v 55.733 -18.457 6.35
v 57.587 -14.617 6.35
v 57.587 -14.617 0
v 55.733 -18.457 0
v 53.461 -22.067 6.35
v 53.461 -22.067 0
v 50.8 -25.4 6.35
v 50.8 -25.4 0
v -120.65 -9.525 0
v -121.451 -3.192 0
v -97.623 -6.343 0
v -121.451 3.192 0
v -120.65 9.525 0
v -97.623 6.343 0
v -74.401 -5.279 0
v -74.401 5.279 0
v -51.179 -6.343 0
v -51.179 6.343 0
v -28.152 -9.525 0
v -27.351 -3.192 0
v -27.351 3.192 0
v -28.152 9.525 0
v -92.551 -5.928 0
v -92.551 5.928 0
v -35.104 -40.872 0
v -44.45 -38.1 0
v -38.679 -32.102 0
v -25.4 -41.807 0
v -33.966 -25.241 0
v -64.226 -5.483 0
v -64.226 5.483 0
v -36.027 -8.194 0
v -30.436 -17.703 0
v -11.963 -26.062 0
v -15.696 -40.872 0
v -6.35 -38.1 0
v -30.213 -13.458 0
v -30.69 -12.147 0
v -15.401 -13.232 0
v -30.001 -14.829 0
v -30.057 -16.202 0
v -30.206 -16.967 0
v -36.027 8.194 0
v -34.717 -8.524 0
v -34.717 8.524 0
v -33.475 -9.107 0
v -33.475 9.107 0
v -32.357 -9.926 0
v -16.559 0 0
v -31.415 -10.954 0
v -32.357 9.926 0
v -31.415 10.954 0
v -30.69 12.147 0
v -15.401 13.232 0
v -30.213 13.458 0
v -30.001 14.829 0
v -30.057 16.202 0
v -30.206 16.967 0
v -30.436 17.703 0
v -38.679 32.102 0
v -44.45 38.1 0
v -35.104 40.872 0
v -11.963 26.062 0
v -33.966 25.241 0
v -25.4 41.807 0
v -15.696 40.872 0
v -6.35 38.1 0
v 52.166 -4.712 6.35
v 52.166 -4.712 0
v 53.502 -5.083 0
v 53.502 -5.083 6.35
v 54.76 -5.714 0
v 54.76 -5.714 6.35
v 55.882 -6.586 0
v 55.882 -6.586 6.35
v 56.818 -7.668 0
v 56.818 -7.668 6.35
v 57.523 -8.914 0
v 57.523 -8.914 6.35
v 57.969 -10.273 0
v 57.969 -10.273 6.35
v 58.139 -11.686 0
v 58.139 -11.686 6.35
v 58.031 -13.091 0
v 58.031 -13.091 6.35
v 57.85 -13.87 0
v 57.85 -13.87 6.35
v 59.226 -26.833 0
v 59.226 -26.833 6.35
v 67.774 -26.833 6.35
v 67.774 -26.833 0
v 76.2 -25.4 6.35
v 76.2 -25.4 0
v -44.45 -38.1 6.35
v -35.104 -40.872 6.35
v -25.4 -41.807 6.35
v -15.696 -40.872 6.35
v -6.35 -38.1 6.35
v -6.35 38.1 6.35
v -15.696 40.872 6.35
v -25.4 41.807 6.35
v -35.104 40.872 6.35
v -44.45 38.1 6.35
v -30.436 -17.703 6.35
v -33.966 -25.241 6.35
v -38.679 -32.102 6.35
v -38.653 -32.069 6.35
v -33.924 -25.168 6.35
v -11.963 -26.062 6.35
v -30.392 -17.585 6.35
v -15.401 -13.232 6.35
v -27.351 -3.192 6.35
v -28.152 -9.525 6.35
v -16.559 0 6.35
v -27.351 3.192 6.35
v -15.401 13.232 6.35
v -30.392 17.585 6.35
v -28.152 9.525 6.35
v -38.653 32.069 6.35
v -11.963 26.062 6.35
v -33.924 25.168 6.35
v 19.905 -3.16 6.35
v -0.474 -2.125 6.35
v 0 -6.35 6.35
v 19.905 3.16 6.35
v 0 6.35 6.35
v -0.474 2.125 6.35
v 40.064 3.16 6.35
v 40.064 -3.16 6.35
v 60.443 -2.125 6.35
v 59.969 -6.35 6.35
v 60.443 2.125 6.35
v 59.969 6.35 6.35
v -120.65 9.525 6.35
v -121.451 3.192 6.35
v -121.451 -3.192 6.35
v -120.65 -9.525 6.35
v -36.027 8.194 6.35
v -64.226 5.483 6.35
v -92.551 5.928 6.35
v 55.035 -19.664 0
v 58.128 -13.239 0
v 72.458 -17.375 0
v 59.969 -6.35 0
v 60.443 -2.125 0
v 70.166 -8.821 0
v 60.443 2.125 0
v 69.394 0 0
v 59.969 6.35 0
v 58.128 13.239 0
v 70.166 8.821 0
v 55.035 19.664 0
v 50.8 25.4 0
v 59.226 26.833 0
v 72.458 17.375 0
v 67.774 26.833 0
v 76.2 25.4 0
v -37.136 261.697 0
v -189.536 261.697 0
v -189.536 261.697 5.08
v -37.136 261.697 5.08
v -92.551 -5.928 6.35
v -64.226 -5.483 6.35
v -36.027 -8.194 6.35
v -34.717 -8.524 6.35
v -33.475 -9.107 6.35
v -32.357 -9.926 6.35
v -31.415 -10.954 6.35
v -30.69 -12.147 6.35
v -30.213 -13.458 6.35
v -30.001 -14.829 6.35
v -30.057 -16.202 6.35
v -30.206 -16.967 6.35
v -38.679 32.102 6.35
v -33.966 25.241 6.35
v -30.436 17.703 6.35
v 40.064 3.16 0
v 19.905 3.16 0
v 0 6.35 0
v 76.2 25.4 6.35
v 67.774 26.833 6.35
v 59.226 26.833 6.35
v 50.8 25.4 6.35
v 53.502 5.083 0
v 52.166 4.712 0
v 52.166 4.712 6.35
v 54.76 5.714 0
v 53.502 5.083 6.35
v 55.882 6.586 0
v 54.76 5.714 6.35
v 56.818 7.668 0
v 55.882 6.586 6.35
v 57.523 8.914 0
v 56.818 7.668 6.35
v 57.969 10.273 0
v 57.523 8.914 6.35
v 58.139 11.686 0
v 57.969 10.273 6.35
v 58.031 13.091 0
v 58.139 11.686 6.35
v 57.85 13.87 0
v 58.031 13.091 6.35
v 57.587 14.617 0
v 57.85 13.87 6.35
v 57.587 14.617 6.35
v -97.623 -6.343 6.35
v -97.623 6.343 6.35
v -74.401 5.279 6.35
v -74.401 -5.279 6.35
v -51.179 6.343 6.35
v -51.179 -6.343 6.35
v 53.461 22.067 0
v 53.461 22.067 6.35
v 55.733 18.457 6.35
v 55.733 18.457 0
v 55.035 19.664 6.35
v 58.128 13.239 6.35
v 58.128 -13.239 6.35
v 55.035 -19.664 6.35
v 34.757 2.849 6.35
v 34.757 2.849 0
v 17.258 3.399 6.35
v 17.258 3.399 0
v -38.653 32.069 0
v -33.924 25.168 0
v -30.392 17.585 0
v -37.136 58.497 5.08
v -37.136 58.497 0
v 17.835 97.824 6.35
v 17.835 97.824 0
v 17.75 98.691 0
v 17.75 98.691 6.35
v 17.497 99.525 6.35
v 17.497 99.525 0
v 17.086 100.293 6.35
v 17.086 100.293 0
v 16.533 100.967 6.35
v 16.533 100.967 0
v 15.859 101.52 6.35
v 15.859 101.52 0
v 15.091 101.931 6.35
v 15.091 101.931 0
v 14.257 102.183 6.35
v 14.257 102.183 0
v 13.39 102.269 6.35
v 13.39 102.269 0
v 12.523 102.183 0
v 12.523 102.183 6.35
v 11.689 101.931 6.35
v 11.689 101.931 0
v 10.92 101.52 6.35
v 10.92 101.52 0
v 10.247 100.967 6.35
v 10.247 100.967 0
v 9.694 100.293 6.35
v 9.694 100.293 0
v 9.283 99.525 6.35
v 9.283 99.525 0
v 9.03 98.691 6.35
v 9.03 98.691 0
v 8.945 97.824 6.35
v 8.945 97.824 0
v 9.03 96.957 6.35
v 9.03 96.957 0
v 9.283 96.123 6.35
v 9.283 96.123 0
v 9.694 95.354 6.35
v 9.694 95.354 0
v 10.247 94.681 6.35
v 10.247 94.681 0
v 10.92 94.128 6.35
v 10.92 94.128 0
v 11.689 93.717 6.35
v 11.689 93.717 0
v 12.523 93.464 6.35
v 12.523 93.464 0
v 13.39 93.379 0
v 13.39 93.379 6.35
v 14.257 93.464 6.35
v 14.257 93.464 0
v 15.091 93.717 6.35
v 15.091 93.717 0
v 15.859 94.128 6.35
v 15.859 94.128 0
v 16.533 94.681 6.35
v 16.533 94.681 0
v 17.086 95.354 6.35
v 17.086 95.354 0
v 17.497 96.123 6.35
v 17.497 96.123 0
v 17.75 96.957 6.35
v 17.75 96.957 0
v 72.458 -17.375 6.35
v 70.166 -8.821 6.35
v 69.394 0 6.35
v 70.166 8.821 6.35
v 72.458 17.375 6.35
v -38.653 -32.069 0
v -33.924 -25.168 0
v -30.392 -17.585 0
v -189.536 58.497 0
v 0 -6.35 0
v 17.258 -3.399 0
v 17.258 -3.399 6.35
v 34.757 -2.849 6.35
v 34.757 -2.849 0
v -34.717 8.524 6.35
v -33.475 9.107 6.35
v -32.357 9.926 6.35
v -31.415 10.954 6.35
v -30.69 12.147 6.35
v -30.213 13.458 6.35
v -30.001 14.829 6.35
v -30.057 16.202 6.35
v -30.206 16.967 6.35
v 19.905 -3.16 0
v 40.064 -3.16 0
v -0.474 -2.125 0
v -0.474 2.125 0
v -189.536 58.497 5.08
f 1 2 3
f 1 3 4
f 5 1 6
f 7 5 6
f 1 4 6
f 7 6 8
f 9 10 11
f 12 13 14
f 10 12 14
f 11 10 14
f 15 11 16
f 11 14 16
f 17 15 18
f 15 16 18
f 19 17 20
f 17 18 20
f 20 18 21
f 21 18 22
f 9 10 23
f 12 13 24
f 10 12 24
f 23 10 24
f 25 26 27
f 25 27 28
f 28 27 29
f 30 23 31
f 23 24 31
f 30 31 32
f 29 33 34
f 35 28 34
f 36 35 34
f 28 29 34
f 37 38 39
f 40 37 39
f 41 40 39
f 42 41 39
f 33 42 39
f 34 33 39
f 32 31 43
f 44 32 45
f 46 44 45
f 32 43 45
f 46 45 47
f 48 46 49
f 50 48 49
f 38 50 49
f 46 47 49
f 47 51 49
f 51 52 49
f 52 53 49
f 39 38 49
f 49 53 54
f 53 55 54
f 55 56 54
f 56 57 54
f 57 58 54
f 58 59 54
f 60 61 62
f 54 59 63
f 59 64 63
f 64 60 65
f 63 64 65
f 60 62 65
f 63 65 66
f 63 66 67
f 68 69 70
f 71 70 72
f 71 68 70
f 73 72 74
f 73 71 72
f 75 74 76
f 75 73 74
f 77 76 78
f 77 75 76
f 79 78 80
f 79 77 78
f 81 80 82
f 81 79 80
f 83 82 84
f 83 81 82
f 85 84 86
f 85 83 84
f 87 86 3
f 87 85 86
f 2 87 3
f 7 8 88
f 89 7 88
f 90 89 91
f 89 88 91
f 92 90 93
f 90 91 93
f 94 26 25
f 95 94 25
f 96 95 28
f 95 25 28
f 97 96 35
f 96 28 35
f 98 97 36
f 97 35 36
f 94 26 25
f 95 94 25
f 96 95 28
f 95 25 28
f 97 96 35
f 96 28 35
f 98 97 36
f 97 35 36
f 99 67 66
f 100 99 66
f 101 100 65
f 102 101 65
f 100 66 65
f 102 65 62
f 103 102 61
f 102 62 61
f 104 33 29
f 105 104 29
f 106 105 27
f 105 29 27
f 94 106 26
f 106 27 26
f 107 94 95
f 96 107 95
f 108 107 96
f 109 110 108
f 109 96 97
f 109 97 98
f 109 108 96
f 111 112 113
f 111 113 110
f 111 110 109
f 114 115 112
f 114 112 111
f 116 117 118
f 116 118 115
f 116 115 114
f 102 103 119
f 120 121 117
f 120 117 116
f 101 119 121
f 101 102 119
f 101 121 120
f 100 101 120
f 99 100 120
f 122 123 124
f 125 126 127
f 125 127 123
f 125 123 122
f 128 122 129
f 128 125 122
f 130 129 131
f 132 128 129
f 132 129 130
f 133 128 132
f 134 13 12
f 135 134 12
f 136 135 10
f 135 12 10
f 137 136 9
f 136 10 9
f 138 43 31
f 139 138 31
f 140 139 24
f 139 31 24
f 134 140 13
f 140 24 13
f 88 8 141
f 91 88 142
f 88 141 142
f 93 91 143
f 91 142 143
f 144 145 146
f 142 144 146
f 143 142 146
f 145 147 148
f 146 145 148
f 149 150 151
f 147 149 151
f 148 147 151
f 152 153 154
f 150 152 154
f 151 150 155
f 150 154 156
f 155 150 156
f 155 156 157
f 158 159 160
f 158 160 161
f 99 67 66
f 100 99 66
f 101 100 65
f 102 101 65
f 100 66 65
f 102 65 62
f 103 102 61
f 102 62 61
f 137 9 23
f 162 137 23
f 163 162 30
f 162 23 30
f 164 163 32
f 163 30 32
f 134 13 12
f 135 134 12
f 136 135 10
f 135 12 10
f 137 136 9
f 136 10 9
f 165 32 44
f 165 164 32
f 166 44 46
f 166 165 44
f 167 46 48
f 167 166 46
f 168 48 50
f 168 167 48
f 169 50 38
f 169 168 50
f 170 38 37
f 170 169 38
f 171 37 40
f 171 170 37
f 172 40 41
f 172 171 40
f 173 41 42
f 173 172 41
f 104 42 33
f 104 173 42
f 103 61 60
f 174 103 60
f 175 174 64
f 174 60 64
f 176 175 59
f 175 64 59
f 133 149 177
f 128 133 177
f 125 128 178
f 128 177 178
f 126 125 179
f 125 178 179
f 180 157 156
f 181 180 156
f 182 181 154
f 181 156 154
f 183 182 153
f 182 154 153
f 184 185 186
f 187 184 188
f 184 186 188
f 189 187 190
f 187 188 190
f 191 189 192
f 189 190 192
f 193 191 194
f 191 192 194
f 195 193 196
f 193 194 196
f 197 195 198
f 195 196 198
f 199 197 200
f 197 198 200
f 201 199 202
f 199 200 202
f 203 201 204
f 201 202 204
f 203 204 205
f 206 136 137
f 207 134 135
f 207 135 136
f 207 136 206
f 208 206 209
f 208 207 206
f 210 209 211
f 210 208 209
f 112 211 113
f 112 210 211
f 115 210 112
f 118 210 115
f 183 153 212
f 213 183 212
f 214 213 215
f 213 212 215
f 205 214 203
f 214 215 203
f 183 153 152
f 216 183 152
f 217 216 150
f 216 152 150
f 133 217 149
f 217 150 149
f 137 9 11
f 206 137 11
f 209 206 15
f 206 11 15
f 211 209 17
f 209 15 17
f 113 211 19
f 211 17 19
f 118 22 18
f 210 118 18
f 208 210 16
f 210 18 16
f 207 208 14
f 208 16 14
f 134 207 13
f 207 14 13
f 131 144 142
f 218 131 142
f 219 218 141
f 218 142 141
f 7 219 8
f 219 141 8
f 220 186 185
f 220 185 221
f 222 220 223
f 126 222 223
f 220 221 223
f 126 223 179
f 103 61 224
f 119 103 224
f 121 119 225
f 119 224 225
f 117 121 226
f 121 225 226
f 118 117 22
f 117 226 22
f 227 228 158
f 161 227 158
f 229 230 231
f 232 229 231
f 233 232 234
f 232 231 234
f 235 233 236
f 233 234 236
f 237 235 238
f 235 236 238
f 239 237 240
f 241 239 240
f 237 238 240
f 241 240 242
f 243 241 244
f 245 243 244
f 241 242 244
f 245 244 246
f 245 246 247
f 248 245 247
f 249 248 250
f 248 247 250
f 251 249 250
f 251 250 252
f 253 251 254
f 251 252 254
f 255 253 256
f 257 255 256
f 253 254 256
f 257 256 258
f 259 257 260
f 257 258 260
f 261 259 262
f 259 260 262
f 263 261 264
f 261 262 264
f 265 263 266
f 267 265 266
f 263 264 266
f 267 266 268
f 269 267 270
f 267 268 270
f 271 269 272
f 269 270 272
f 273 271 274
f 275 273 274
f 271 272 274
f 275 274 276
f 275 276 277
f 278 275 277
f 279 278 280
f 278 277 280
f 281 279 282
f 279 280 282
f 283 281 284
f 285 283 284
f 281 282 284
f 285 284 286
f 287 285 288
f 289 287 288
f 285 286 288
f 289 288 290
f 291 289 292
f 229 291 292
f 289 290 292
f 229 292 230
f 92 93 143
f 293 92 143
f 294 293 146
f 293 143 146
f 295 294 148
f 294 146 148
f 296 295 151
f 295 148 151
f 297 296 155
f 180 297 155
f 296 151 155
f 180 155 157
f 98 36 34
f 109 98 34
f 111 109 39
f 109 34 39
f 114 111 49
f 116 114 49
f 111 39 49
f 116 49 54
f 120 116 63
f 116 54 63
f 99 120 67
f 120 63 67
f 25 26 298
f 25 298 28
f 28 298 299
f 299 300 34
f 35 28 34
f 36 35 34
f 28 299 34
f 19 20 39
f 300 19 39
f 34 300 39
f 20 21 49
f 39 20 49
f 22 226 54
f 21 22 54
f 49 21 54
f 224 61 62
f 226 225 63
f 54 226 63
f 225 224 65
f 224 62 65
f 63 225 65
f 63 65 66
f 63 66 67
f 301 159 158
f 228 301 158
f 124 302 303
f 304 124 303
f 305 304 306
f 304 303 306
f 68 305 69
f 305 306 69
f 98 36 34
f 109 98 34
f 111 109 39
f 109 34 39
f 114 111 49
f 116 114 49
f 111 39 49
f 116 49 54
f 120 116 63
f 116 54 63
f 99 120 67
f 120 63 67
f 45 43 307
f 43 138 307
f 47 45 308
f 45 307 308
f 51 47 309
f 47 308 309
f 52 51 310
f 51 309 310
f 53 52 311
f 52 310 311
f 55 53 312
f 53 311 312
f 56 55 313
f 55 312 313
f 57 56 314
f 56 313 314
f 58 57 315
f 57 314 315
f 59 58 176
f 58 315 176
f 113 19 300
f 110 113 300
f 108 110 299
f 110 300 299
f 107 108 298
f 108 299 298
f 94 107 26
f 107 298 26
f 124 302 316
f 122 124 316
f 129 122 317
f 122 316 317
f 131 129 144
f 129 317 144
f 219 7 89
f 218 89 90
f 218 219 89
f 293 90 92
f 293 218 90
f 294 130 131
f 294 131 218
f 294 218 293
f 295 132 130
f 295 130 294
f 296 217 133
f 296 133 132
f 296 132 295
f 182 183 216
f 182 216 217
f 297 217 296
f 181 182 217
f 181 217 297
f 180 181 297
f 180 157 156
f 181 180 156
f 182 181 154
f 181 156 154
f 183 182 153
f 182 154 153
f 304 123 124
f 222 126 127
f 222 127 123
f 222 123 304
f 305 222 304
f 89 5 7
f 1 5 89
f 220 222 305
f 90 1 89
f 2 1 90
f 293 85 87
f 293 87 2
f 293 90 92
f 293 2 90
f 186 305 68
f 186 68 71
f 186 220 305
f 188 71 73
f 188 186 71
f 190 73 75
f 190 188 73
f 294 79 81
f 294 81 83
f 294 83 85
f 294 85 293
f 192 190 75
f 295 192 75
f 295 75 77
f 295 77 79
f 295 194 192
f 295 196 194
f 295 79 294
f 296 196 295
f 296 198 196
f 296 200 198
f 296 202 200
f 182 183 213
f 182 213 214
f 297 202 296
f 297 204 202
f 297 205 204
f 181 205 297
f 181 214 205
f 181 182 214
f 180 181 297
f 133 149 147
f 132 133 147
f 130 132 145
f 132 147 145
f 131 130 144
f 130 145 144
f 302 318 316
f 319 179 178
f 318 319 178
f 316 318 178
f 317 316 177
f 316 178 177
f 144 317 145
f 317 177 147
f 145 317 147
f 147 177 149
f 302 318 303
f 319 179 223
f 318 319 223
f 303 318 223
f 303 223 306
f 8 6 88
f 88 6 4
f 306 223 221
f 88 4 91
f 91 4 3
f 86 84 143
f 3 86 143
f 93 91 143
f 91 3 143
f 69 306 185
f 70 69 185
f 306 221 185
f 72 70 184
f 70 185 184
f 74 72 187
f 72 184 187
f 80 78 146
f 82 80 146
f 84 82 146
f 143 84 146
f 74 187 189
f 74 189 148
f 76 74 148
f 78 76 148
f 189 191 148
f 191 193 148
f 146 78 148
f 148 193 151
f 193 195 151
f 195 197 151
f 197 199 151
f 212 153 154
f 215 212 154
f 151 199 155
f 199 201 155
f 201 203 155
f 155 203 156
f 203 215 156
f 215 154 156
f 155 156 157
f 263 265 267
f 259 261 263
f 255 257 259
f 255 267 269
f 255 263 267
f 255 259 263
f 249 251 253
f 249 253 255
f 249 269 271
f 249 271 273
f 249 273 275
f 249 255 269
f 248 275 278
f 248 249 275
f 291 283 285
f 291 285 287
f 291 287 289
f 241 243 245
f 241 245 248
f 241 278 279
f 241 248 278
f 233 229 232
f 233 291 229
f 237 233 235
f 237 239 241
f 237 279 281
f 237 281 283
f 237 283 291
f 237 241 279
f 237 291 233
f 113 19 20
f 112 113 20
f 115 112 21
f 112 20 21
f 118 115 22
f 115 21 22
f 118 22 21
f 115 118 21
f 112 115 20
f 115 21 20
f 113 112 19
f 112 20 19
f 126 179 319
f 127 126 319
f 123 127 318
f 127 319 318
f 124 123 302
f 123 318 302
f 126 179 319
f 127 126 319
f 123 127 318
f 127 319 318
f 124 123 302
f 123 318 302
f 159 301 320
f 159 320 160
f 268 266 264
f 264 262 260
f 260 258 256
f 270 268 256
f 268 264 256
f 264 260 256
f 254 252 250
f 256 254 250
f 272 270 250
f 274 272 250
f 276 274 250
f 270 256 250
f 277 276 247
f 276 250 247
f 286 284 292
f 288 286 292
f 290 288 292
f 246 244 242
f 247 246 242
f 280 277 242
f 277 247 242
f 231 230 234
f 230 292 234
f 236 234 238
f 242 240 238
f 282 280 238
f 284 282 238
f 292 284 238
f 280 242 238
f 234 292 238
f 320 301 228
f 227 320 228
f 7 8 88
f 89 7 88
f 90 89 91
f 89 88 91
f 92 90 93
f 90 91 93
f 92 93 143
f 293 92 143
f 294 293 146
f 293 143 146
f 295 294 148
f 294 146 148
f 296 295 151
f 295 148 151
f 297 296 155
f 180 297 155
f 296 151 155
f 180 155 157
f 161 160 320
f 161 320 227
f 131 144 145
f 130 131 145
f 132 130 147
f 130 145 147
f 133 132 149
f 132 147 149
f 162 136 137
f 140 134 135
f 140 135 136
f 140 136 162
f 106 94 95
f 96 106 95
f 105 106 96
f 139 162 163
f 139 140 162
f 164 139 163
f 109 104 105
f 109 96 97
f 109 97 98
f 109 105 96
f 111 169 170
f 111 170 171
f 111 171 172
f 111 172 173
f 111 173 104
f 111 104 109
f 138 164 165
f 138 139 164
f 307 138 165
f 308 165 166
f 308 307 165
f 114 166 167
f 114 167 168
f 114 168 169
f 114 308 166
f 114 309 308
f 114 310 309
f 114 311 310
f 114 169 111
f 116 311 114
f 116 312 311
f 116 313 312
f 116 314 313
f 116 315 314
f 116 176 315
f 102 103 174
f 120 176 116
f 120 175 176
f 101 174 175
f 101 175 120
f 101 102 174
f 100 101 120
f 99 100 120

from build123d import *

# Parameters (mm, degrees)
F1_DEPTH  = 6.35
F2_R      = 7.112
F4_DEPTH  = 6.35
F5_R      = 7.239
F6_DEPTH  = 6.35
F7_DEPTH  = 6.35
F8_DEPTH  = 6.35
F9_DEPTH  = 6.35
F10_W     = 152.4
F10_H     = 203.2
F11_DEPTH = 5.08
F12_R     = 4.445
F13_DEPTH = 6.35


# Not quite as in the source:
# - a length typed as a fraction of an inch, garbled in the dataset ("3 / 203.2 mm" for 3/8 in), is restored


with BuildPart() as f1:
    # F0 (on Top) → F1 (new body)
    with BuildSketch(Plane.XY):
        with BuildLine():
            ThreePointArc((-28.1519998261, -9.525), (-27.2510416505, 0), (-28.1519998261, 9.525))
            ThreePointArc((-28.1519998261, 9.525), (-74.400999913, 5.2789388898), (-120.65, 9.525))
            ThreePointArc((-120.65, 9.525), (-121.5509581755, 0), (-120.65, -9.525))
            ThreePointArc((-120.65, -9.525), (-74.400999913, -5.2789388898), (-28.1519998261, -9.525))
        make_face()
        with BuildLine():
            ThreePointArc((-6.35, -38.1), (-16.5588642316, 0), (-6.35, 38.1))
            ThreePointArc((-6.35, 38.1), (-25.4, 41.8071396069), (-44.45, 38.1))
            ThreePointArc((-44.45, 38.1), (-33.9239678598, 25.1682609385), (-28.1519998261, 9.525))
            ThreePointArc((-28.1519998261, 9.525), (-27.2510416505, 0), (-28.1519998261, -9.525))
            ThreePointArc((-28.1519998261, -9.525), (-33.9239678598, -25.1682609385), (-44.45, -38.1))
            ThreePointArc((-44.45, -38.1), (-25.4, -41.8071396069), (-6.35, -38.1))
        make_face()
    extrude(amount=F1_DEPTH)

    # F2
    f2_edges = [f1.edges().sort_by_distance(p)[0] for p in [
        (-28.152, 9.525, 3.175),
        (-28.152, -9.525, 3.175),
    ]]
    fillet(f2_edges, radius=F2_R)


with BuildPart() as f4:
    # F3 (on Top) → F4 (new body)
    with BuildSketch(Plane.XY):
        with BuildLine():
            ThreePointArc((59.9690433084, -6.35), (60.5019366858, 0), (59.9690433084, 6.35))
            ThreePointArc((59.9690433084, 6.35), (29.9845216542, 2.7595963091), (0, 6.35))
            ThreePointArc((0, 6.35), (-0.5328933773, 0), (0, -6.35))
            ThreePointArc((0, -6.35), (29.9845216542, -2.7595963091), (59.9690433084, -6.35))
        make_face()
        with BuildLine():
            ThreePointArc((76.2, -25.4), (69.3940905122, 0), (76.2, 25.4))
            ThreePointArc((76.2, 25.4), (63.5, 27.0131115032), (50.8, 25.4))
            ThreePointArc((50.8, 25.4), (56.7323391914, 16.5237242714), (59.9690433084, 6.35))
            ThreePointArc((59.9690433084, 6.35), (60.5019366858, 0), (59.9690433084, -6.35))
            ThreePointArc((59.9690433084, -6.35), (56.7323391914, -16.5237242714), (50.8, -25.4))
            ThreePointArc((50.8, -25.4), (63.5, -27.0131115032), (76.2, -25.4))
        make_face()
    extrude(amount=F4_DEPTH)

    # F5
    f5_edges = [f4.edges().sort_by_distance(p)[0] for p in [
        (59.969043, -6.35, 3.175),
        (59.969043, 6.35, 3.175),
    ]]
    fillet(f5_edges, radius=F5_R)


with BuildPart() as f6:
    # F0 (on Top) → F6 (new body)
    with BuildSketch(Plane.XY):
        with BuildLine():
            ThreePointArc((-6.35, -38.1), (-16.5588642316, 0), (-6.35, 38.1))
            ThreePointArc((-6.35, 38.1), (-25.4, 41.8071396069), (-44.45, 38.1))
            ThreePointArc((-44.45, 38.1), (-33.9239678598, 25.1682609385), (-28.1519998261, 9.525))
            ThreePointArc((-28.1519998261, 9.525), (-27.2510416505, 0), (-28.1519998261, -9.525))
            ThreePointArc((-28.1519998261, -9.525), (-33.9239678598, -25.1682609385), (-44.45, -38.1))
            ThreePointArc((-44.45, -38.1), (-25.4, -41.8071396069), (-6.35, -38.1))
        make_face()
    extrude(amount=F6_DEPTH)


with BuildPart() as f7:
    # F0 (on Top) → F7 (new body)
    with BuildSketch(Plane.XY):
        with BuildLine():
            ThreePointArc((-28.1519998261, -9.525), (-27.2510416505, 0), (-28.1519998261, 9.525))
            ThreePointArc((-28.1519998261, 9.525), (-74.400999913, 5.2789388898), (-120.65, 9.525))
            ThreePointArc((-120.65, 9.525), (-121.5509581755, 0), (-120.65, -9.525))
            ThreePointArc((-120.65, -9.525), (-74.400999913, -5.2789388898), (-28.1519998261, -9.525))
        make_face()
    extrude(amount=F7_DEPTH)


with BuildPart() as f8:
    # F3 (on Top) → F8 (new body)
    with BuildSketch(Plane.XY):
        with BuildLine():
            ThreePointArc((76.2, -25.4), (69.3940905122, 0), (76.2, 25.4))
            ThreePointArc((76.2, 25.4), (63.5, 27.0131115032), (50.8, 25.4))
            ThreePointArc((50.8, 25.4), (56.7323391914, 16.5237242714), (59.9690433084, 6.35))
            ThreePointArc((59.9690433084, 6.35), (60.5019366858, 0), (59.9690433084, -6.35))
            ThreePointArc((59.9690433084, -6.35), (56.7323391914, -16.5237242714), (50.8, -25.4))
            ThreePointArc((50.8, -25.4), (63.5, -27.0131115032), (76.2, -25.4))
        make_face()
    extrude(amount=F8_DEPTH)


with BuildPart() as f9:
    # F3 (on Top) → F9 (new body)
    with BuildSketch(Plane.XY):
        with BuildLine():
            ThreePointArc((59.9690433084, -6.35), (60.5019366858, 0), (59.9690433084, 6.35))
            ThreePointArc((59.9690433084, 6.35), (29.9845216542, 2.7595963091), (0, 6.35))
            ThreePointArc((0, 6.35), (-0.5328933773, 0), (0, -6.35))
            ThreePointArc((0, -6.35), (29.9845216542, -2.7595963091), (59.9690433084, -6.35))
        make_face()
    extrude(amount=F9_DEPTH)


with BuildPart() as f11:
    # F10 (on Top) → F11 (new body)
    with BuildSketch(Plane.XY):
        with Locations((-113.3361747384, 160.0966391325)):
            Rectangle(F10_W, F10_H)
    extrude(amount=F11_DEPTH)


with BuildPart() as f13:
    # F12 (on Top) → F13 (new body)
    with BuildSketch(Plane.XY):
        with Locations((13.3899739012, 97.8238731623)):
            Circle(F12_R)
    extrude(amount=F13_DEPTH)


solid = Compound([f1.part, f4.part, f6.part, f7.part, f8.part, f9.part, f11.part, f13.part])
